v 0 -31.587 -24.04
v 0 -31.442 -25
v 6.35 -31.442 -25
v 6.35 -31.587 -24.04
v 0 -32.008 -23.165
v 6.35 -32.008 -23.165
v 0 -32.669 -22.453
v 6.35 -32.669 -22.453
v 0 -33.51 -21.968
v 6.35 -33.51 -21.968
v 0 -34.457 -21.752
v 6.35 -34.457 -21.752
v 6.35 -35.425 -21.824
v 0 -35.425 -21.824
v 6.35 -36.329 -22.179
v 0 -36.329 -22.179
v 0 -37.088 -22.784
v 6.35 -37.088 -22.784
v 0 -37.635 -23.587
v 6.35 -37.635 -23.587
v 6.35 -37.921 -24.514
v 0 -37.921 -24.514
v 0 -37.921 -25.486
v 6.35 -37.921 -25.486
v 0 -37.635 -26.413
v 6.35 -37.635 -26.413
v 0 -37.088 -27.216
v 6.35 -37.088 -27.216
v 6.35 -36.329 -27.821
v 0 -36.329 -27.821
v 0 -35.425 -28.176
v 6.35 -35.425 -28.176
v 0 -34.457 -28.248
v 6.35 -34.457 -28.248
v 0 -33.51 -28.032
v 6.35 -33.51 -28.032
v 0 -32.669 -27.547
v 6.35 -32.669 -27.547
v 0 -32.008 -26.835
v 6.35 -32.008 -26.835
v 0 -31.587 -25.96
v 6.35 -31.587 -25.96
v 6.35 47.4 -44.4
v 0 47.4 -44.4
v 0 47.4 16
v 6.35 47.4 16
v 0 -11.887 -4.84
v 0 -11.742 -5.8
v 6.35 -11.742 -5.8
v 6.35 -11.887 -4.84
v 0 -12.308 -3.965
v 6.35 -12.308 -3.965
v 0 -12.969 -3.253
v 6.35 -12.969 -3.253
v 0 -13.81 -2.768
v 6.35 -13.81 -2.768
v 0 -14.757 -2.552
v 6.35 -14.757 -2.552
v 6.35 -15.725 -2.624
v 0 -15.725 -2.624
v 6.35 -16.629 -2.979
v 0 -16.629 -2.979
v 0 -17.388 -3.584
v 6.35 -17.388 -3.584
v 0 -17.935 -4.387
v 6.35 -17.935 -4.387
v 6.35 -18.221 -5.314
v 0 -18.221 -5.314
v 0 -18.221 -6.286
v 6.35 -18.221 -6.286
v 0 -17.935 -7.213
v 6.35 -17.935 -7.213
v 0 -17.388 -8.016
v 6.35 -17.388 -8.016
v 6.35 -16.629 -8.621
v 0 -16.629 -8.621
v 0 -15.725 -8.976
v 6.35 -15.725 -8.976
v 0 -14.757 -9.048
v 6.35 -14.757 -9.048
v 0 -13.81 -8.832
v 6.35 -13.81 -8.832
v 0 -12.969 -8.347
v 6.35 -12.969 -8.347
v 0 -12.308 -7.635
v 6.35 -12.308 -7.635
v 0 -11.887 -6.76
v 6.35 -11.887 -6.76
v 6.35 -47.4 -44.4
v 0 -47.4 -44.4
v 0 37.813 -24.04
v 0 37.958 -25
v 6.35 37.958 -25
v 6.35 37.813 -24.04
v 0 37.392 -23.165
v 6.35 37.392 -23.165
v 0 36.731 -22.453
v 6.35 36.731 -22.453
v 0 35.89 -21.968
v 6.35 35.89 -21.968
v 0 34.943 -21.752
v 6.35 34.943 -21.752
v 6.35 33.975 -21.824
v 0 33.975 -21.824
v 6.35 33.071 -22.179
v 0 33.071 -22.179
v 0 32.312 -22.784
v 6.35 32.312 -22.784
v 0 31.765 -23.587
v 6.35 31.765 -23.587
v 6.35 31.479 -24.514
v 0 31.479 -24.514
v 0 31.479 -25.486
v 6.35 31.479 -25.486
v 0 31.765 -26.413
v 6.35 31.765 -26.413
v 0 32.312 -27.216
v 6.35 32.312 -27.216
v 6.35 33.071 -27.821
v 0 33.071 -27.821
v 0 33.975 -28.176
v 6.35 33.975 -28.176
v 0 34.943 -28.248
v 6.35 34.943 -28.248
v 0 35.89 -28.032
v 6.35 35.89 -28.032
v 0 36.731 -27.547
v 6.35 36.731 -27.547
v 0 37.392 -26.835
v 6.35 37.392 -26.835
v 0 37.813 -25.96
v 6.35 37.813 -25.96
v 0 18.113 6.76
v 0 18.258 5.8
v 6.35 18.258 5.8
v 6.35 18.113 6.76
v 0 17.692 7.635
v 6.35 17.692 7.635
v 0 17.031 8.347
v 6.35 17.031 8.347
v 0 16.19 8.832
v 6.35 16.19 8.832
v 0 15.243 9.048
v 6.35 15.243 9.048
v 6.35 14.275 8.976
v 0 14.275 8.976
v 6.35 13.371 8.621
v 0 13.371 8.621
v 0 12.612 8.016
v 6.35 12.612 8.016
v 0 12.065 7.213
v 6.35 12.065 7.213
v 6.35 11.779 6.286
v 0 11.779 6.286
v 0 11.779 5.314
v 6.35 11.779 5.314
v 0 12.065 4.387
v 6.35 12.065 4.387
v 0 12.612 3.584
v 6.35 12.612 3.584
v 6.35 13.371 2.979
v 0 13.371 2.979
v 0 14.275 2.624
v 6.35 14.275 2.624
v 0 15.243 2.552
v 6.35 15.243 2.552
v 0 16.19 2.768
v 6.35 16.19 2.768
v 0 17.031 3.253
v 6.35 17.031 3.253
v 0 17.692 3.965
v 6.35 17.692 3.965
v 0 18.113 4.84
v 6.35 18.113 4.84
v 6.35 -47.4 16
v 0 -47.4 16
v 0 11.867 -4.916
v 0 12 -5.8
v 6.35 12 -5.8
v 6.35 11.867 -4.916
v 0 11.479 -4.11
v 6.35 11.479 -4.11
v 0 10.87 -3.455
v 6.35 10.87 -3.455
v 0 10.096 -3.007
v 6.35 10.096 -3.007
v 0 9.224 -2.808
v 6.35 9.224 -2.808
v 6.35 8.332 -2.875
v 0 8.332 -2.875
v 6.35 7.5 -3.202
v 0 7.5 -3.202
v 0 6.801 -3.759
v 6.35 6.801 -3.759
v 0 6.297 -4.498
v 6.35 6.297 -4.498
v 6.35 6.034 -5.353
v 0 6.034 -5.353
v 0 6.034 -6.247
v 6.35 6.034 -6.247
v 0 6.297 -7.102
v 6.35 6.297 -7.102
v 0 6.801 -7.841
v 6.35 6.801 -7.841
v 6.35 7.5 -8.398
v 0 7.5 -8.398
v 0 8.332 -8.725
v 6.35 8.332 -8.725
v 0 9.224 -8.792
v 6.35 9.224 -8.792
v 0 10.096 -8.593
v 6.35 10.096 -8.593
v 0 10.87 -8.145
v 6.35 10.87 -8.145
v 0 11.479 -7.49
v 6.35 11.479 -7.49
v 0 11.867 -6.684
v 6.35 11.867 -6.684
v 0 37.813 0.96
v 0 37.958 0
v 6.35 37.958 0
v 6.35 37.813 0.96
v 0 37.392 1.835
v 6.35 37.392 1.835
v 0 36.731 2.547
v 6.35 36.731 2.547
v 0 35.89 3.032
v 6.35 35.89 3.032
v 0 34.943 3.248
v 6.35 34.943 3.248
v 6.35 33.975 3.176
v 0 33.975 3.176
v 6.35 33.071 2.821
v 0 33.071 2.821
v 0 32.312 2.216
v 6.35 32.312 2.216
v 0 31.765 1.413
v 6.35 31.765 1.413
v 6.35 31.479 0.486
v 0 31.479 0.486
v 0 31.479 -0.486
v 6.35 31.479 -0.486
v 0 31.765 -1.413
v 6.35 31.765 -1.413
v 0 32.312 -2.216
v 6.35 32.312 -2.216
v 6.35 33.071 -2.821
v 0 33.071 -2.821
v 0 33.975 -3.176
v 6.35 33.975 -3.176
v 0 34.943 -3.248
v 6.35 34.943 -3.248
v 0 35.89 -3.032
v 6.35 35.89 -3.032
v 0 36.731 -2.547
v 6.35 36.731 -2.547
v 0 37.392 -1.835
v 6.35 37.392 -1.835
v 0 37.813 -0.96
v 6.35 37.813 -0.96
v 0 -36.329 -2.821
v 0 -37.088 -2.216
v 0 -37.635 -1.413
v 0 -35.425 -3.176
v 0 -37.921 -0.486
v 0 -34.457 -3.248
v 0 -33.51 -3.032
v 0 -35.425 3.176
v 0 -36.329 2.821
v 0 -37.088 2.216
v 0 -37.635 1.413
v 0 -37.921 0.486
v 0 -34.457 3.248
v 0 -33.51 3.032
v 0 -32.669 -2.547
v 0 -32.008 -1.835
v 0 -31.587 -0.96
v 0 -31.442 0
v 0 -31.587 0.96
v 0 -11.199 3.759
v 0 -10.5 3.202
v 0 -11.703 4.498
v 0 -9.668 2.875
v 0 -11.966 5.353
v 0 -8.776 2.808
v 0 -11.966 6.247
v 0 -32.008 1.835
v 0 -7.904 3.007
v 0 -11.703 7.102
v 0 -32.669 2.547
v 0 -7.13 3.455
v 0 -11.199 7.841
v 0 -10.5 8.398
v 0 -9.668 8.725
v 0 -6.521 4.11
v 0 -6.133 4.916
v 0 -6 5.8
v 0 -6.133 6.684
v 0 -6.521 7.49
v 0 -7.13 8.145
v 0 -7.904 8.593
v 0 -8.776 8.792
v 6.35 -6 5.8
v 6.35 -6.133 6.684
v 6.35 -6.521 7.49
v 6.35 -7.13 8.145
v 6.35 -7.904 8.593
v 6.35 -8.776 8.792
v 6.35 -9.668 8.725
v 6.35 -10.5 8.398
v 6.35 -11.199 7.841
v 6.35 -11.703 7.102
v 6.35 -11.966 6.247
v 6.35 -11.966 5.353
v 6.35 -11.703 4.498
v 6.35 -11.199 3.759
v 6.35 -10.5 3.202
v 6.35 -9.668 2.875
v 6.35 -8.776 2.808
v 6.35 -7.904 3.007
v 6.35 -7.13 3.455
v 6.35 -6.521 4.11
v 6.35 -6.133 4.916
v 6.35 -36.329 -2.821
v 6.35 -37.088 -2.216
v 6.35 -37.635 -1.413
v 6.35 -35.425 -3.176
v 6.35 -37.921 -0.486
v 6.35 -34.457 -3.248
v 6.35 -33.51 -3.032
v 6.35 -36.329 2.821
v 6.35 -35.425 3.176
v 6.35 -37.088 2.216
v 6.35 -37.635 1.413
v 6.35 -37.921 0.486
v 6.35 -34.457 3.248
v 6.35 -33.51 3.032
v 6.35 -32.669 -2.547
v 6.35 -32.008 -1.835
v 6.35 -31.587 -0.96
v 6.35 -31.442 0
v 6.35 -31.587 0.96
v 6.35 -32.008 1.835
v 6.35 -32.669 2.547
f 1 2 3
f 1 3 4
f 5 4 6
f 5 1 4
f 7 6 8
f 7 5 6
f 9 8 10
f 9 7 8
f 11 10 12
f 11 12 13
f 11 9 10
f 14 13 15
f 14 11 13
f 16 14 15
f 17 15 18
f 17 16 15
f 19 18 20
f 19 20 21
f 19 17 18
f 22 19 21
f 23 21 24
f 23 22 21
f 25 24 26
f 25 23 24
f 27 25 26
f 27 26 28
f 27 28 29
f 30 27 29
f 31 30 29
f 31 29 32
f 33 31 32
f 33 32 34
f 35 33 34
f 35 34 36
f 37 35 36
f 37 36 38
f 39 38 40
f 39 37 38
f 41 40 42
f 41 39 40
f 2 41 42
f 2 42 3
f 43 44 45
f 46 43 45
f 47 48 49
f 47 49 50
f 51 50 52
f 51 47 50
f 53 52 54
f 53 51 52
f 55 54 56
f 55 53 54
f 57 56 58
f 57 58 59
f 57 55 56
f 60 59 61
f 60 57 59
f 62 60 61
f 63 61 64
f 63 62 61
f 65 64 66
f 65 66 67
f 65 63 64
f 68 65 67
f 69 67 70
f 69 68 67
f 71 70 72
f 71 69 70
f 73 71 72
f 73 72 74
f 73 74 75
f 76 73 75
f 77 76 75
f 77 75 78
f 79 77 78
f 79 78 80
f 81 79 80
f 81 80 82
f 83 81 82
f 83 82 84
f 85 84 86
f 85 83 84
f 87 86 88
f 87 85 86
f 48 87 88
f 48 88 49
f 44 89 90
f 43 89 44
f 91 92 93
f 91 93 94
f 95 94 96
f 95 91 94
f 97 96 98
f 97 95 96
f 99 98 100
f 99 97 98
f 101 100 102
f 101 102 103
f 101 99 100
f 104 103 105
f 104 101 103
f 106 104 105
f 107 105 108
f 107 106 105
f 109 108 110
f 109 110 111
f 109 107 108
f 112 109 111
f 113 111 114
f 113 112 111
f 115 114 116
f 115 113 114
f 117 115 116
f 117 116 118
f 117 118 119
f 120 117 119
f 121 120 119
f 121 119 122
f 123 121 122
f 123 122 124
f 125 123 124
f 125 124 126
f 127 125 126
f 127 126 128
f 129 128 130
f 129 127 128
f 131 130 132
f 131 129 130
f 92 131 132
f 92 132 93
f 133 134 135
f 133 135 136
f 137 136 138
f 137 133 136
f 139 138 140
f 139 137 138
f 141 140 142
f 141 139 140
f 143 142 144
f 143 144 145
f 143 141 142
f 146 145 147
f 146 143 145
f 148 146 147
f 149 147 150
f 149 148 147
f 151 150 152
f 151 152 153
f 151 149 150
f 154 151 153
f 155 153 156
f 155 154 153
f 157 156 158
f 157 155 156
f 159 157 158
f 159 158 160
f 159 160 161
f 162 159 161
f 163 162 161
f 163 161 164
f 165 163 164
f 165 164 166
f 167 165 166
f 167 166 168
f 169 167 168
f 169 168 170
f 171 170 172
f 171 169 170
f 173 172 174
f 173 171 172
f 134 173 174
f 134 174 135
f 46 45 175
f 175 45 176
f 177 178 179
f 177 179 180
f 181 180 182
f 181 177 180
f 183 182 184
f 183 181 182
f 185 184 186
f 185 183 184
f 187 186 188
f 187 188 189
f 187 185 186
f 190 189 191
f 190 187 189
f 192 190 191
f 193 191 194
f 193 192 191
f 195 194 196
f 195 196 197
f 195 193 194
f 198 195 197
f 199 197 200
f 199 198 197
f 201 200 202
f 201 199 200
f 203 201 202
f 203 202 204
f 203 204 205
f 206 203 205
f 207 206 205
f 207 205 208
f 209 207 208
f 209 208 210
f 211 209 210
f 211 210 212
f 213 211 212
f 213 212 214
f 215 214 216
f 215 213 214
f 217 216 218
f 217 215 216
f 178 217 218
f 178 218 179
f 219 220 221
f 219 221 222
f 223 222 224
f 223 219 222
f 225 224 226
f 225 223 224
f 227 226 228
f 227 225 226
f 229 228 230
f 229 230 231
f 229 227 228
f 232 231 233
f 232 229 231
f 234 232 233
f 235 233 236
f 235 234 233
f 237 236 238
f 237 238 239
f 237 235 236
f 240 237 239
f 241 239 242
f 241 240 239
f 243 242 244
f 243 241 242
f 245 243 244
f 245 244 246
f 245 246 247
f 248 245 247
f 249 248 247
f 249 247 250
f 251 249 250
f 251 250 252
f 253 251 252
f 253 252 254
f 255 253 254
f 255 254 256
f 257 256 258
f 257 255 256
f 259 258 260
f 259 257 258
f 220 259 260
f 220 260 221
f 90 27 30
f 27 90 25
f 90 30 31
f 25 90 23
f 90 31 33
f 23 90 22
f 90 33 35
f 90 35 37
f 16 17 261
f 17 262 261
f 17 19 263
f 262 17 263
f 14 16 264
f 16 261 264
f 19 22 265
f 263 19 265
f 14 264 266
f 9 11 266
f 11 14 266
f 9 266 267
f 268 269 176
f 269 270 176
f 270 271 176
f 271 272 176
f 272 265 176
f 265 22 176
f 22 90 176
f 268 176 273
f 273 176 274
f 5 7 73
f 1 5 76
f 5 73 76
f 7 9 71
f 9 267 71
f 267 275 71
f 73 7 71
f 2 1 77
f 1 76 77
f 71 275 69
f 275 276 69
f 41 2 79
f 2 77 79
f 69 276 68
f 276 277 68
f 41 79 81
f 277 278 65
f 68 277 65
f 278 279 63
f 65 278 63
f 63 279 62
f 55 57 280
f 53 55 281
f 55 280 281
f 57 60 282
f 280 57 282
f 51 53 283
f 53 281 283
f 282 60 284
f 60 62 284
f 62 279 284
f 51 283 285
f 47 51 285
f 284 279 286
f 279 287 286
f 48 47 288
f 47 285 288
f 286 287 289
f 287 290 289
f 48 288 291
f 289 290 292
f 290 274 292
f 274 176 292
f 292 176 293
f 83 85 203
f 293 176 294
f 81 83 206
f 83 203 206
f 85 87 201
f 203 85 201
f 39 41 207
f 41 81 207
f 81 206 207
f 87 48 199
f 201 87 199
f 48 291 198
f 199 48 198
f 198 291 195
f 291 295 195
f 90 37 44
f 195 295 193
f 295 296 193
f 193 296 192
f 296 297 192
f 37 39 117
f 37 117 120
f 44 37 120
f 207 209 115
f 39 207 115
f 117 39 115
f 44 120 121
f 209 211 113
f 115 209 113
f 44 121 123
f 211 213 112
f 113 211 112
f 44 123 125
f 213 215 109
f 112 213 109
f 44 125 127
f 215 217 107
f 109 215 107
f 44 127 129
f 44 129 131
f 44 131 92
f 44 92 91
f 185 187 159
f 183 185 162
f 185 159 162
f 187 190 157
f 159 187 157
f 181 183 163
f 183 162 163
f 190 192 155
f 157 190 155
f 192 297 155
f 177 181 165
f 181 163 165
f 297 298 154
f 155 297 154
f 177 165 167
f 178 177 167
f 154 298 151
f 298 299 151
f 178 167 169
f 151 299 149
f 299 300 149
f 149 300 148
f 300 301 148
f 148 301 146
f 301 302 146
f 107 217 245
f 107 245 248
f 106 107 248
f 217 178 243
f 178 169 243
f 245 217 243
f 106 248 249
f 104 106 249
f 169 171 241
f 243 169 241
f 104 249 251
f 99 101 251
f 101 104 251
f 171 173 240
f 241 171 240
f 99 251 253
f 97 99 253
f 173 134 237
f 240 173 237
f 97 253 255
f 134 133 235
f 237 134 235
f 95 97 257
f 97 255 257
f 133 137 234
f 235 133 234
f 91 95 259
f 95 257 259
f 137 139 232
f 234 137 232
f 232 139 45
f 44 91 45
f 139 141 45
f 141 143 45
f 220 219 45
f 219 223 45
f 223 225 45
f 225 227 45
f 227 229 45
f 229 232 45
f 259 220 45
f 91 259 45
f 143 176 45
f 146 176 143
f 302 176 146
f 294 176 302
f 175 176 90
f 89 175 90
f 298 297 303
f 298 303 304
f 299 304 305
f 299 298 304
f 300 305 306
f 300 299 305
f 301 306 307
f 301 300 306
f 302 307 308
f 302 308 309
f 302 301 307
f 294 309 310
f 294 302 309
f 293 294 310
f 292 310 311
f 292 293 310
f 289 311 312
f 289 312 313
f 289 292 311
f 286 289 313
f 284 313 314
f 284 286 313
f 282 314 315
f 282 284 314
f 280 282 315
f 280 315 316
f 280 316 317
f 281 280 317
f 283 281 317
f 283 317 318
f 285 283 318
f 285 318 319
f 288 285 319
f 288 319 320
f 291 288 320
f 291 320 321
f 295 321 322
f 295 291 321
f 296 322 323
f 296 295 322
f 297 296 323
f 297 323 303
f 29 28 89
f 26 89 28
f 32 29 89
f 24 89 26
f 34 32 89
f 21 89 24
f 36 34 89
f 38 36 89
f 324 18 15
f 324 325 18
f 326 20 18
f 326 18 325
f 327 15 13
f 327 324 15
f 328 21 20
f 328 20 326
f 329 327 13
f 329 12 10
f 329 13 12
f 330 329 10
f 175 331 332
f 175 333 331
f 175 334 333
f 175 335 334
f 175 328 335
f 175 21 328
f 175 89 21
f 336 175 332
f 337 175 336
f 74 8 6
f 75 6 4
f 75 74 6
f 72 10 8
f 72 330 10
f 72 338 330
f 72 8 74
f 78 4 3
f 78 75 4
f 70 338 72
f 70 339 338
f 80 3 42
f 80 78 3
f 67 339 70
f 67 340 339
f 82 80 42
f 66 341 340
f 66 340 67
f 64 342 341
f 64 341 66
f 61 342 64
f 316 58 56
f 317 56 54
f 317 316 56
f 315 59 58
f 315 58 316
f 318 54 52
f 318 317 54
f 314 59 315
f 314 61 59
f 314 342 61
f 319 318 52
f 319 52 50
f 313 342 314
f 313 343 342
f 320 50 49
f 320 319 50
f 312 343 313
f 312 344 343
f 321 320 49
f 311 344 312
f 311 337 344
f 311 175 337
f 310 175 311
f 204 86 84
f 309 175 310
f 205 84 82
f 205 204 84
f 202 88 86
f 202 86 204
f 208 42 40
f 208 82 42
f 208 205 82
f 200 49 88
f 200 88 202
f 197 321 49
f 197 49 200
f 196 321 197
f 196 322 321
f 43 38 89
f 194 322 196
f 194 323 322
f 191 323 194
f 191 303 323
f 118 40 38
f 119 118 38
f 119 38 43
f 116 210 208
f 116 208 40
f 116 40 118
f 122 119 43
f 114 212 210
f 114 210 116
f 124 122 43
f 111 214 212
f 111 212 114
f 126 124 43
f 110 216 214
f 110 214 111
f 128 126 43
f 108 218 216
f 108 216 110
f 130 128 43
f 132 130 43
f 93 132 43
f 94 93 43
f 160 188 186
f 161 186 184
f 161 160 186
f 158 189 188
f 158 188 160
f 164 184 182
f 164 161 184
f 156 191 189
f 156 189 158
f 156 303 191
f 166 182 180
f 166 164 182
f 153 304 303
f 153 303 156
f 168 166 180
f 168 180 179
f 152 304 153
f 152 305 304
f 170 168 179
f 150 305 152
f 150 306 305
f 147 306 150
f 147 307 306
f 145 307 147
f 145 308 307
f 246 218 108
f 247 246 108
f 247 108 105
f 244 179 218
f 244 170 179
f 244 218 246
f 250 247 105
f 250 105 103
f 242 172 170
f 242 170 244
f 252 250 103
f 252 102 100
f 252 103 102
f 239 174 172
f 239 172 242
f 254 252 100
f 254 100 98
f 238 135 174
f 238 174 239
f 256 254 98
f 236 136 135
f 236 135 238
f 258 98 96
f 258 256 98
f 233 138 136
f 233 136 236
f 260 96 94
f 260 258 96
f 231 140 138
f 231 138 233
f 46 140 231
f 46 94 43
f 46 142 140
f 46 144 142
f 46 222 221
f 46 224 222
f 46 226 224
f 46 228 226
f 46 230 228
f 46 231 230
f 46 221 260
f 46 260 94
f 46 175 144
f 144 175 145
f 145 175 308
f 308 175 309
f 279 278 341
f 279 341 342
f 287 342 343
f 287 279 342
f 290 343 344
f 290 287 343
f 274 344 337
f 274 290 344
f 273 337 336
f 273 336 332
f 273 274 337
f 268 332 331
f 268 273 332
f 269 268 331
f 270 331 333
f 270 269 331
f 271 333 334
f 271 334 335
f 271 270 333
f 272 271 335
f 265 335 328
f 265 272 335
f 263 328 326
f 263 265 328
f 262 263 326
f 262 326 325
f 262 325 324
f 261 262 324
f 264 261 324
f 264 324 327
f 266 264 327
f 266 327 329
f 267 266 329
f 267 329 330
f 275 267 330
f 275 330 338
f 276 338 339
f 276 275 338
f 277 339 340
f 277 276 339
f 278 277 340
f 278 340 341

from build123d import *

# Parameters (mm, degrees)
SKETCH1_R           = 3
SKETCH1_R_2         = 3.25755
BOSS_EXTRUDE1_DEPTH = 6.35
SKETCH2_W           = 94.8
SKETCH2_H           = 25.4
CUT_EXTRUDE1_DEPTH  = 6.35


with BuildPart() as part:
    # Sketch1 → Boss-Extrude1 (new body)
    with BuildSketch(Plane.YZ):
        Polygon((-47.4, -25), (-47.4, -69.8), (47.4, -69.8), (47.4, 16), (-47.4, 16), align=None)
        with Locations((-9, 5.8)):
            Circle(SKETCH1_R, mode=Mode.SUBTRACT)
        with Locations((-15, -5.8)):
            Circle(SKETCH1_R_2, mode=Mode.SUBTRACT)
        with Locations((9, -5.8)):
            Circle(SKETCH1_R, mode=Mode.SUBTRACT)
        with Locations((15, 5.8)):
            Circle(SKETCH1_R_2, mode=Mode.SUBTRACT)
        with Locations((-34.7, -57.1)):
            Circle(SKETCH1_R_2, mode=Mode.SUBTRACT)
        with Locations((34.7, -57.1)):
            Circle(SKETCH1_R_2, mode=Mode.SUBTRACT)
        with Locations((-34.7, -25)):
            Circle(SKETCH1_R_2, mode=Mode.SUBTRACT)
        with Locations((-34.7, 0)):
            Circle(SKETCH1_R_2, mode=Mode.SUBTRACT)
        with Locations((34.7, 0)):
            Circle(SKETCH1_R_2, mode=Mode.SUBTRACT)
        with Locations((34.7, -25)):
            Circle(SKETCH1_R_2, mode=Mode.SUBTRACT)
    extrude(amount=BOSS_EXTRUDE1_DEPTH)

    # Sketch2 → Cut-Extrude1 (cut)
    with BuildSketch(Plane.YZ.offset(6.35)):
        with Locations((0, -57.1)):
            Rectangle(SKETCH2_W, SKETCH2_H)
    extrude(amount=-CUT_EXTRUDE1_DEPTH, mode=Mode.SUBTRACT)


solid = part.part
